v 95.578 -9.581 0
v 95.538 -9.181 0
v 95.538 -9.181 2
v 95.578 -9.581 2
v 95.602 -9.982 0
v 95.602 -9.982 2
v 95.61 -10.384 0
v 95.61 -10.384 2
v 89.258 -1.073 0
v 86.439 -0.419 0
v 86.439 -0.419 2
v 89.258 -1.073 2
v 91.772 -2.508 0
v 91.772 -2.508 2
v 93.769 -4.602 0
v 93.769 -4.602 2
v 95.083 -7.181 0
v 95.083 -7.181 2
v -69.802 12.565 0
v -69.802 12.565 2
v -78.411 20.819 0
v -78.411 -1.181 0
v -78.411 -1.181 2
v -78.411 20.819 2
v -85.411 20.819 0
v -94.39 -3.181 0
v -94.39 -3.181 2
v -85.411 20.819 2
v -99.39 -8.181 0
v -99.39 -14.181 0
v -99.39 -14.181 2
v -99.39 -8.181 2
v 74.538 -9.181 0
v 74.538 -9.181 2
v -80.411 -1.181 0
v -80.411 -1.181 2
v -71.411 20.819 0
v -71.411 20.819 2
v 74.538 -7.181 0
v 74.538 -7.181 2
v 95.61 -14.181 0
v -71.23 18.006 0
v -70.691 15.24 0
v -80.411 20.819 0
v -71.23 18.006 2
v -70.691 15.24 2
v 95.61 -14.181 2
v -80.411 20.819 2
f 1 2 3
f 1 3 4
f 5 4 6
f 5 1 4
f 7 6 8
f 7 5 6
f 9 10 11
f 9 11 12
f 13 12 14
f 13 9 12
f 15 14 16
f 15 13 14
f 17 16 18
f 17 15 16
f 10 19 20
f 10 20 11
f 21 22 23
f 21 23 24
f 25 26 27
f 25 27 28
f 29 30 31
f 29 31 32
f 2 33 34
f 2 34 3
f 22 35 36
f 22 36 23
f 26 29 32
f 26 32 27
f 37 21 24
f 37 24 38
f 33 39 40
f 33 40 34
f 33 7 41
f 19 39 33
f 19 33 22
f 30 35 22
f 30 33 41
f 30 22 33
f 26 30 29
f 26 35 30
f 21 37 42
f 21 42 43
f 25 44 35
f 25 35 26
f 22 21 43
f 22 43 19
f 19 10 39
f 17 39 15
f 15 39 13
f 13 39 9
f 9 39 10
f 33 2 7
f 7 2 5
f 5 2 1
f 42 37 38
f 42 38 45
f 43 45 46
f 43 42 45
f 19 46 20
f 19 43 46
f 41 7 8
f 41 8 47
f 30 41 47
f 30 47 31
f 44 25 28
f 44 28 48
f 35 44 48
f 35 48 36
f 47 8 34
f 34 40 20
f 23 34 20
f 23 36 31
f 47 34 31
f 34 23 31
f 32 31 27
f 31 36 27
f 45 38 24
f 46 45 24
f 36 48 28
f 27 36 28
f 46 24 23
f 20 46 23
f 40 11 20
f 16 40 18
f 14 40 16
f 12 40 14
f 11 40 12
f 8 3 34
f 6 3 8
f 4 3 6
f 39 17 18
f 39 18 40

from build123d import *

# Parameters (mm, degrees)
RESSALTO_EXTRUS_O1_DEPTH = 2


with BuildPart() as part:
    # Esboço1 → Ressalto-extrusão1 (new body)
    with BuildSketch(Plane.XY):
        with BuildLine():
            Line((-99.38960786, -14.180843063), (-99.38960786, -8.180843063))
            Line((-99.38960786, -8.180843063), (-94.38960786, -3.180843063))
            Line((-94.38960786, -3.180843063), (-85.410682211, 20.819156937))
            Line((-85.410682211, 20.819156937), (-80.410682211, 20.819156937))
            Line((-80.410682211, 20.819156937), (-80.410682211, -1.180843063))
            Line((-80.410682211, -1.180843063), (-78.410682211, -1.180843063))
            Line((-78.410682211, -1.180843063), (-78.410682211, 20.819156937))
            Line((-78.410682211, 20.819156937), (-71.410682211, 20.819156937))
            ThreePointArc((-71.410682211, 20.819156937), (-71.004691587, 16.614538042), (-69.801720857, 12.565277632))
            Line((-69.801720857, 12.565277632), (86.438560019, -0.41864307))
            ThreePointArc((86.438560019, -0.41864307), (91.771593682, -2.507769172), (95.083402302, -7.180843063))
            Line((95.083402302, -7.180843063), (74.537713689, -7.180843063))
            Line((74.537713689, -7.180843063), (74.537713689, -9.180843063))
            Line((74.537713689, -9.180843063), (95.537713689, -9.180843063))
            ThreePointArc((95.537713689, -9.180843063), (95.59220599, -9.781470716), (95.61039214, -10.384290965))
            Line((95.61039214, -10.384290965), (95.61039214, -14.180843063))
            Line((95.61039214, -14.180843063), (-99.38960786, -14.180843063))
        make_face()
    extrude(amount=RESSALTO_EXTRUS_O1_DEPTH)


solid = part.part
